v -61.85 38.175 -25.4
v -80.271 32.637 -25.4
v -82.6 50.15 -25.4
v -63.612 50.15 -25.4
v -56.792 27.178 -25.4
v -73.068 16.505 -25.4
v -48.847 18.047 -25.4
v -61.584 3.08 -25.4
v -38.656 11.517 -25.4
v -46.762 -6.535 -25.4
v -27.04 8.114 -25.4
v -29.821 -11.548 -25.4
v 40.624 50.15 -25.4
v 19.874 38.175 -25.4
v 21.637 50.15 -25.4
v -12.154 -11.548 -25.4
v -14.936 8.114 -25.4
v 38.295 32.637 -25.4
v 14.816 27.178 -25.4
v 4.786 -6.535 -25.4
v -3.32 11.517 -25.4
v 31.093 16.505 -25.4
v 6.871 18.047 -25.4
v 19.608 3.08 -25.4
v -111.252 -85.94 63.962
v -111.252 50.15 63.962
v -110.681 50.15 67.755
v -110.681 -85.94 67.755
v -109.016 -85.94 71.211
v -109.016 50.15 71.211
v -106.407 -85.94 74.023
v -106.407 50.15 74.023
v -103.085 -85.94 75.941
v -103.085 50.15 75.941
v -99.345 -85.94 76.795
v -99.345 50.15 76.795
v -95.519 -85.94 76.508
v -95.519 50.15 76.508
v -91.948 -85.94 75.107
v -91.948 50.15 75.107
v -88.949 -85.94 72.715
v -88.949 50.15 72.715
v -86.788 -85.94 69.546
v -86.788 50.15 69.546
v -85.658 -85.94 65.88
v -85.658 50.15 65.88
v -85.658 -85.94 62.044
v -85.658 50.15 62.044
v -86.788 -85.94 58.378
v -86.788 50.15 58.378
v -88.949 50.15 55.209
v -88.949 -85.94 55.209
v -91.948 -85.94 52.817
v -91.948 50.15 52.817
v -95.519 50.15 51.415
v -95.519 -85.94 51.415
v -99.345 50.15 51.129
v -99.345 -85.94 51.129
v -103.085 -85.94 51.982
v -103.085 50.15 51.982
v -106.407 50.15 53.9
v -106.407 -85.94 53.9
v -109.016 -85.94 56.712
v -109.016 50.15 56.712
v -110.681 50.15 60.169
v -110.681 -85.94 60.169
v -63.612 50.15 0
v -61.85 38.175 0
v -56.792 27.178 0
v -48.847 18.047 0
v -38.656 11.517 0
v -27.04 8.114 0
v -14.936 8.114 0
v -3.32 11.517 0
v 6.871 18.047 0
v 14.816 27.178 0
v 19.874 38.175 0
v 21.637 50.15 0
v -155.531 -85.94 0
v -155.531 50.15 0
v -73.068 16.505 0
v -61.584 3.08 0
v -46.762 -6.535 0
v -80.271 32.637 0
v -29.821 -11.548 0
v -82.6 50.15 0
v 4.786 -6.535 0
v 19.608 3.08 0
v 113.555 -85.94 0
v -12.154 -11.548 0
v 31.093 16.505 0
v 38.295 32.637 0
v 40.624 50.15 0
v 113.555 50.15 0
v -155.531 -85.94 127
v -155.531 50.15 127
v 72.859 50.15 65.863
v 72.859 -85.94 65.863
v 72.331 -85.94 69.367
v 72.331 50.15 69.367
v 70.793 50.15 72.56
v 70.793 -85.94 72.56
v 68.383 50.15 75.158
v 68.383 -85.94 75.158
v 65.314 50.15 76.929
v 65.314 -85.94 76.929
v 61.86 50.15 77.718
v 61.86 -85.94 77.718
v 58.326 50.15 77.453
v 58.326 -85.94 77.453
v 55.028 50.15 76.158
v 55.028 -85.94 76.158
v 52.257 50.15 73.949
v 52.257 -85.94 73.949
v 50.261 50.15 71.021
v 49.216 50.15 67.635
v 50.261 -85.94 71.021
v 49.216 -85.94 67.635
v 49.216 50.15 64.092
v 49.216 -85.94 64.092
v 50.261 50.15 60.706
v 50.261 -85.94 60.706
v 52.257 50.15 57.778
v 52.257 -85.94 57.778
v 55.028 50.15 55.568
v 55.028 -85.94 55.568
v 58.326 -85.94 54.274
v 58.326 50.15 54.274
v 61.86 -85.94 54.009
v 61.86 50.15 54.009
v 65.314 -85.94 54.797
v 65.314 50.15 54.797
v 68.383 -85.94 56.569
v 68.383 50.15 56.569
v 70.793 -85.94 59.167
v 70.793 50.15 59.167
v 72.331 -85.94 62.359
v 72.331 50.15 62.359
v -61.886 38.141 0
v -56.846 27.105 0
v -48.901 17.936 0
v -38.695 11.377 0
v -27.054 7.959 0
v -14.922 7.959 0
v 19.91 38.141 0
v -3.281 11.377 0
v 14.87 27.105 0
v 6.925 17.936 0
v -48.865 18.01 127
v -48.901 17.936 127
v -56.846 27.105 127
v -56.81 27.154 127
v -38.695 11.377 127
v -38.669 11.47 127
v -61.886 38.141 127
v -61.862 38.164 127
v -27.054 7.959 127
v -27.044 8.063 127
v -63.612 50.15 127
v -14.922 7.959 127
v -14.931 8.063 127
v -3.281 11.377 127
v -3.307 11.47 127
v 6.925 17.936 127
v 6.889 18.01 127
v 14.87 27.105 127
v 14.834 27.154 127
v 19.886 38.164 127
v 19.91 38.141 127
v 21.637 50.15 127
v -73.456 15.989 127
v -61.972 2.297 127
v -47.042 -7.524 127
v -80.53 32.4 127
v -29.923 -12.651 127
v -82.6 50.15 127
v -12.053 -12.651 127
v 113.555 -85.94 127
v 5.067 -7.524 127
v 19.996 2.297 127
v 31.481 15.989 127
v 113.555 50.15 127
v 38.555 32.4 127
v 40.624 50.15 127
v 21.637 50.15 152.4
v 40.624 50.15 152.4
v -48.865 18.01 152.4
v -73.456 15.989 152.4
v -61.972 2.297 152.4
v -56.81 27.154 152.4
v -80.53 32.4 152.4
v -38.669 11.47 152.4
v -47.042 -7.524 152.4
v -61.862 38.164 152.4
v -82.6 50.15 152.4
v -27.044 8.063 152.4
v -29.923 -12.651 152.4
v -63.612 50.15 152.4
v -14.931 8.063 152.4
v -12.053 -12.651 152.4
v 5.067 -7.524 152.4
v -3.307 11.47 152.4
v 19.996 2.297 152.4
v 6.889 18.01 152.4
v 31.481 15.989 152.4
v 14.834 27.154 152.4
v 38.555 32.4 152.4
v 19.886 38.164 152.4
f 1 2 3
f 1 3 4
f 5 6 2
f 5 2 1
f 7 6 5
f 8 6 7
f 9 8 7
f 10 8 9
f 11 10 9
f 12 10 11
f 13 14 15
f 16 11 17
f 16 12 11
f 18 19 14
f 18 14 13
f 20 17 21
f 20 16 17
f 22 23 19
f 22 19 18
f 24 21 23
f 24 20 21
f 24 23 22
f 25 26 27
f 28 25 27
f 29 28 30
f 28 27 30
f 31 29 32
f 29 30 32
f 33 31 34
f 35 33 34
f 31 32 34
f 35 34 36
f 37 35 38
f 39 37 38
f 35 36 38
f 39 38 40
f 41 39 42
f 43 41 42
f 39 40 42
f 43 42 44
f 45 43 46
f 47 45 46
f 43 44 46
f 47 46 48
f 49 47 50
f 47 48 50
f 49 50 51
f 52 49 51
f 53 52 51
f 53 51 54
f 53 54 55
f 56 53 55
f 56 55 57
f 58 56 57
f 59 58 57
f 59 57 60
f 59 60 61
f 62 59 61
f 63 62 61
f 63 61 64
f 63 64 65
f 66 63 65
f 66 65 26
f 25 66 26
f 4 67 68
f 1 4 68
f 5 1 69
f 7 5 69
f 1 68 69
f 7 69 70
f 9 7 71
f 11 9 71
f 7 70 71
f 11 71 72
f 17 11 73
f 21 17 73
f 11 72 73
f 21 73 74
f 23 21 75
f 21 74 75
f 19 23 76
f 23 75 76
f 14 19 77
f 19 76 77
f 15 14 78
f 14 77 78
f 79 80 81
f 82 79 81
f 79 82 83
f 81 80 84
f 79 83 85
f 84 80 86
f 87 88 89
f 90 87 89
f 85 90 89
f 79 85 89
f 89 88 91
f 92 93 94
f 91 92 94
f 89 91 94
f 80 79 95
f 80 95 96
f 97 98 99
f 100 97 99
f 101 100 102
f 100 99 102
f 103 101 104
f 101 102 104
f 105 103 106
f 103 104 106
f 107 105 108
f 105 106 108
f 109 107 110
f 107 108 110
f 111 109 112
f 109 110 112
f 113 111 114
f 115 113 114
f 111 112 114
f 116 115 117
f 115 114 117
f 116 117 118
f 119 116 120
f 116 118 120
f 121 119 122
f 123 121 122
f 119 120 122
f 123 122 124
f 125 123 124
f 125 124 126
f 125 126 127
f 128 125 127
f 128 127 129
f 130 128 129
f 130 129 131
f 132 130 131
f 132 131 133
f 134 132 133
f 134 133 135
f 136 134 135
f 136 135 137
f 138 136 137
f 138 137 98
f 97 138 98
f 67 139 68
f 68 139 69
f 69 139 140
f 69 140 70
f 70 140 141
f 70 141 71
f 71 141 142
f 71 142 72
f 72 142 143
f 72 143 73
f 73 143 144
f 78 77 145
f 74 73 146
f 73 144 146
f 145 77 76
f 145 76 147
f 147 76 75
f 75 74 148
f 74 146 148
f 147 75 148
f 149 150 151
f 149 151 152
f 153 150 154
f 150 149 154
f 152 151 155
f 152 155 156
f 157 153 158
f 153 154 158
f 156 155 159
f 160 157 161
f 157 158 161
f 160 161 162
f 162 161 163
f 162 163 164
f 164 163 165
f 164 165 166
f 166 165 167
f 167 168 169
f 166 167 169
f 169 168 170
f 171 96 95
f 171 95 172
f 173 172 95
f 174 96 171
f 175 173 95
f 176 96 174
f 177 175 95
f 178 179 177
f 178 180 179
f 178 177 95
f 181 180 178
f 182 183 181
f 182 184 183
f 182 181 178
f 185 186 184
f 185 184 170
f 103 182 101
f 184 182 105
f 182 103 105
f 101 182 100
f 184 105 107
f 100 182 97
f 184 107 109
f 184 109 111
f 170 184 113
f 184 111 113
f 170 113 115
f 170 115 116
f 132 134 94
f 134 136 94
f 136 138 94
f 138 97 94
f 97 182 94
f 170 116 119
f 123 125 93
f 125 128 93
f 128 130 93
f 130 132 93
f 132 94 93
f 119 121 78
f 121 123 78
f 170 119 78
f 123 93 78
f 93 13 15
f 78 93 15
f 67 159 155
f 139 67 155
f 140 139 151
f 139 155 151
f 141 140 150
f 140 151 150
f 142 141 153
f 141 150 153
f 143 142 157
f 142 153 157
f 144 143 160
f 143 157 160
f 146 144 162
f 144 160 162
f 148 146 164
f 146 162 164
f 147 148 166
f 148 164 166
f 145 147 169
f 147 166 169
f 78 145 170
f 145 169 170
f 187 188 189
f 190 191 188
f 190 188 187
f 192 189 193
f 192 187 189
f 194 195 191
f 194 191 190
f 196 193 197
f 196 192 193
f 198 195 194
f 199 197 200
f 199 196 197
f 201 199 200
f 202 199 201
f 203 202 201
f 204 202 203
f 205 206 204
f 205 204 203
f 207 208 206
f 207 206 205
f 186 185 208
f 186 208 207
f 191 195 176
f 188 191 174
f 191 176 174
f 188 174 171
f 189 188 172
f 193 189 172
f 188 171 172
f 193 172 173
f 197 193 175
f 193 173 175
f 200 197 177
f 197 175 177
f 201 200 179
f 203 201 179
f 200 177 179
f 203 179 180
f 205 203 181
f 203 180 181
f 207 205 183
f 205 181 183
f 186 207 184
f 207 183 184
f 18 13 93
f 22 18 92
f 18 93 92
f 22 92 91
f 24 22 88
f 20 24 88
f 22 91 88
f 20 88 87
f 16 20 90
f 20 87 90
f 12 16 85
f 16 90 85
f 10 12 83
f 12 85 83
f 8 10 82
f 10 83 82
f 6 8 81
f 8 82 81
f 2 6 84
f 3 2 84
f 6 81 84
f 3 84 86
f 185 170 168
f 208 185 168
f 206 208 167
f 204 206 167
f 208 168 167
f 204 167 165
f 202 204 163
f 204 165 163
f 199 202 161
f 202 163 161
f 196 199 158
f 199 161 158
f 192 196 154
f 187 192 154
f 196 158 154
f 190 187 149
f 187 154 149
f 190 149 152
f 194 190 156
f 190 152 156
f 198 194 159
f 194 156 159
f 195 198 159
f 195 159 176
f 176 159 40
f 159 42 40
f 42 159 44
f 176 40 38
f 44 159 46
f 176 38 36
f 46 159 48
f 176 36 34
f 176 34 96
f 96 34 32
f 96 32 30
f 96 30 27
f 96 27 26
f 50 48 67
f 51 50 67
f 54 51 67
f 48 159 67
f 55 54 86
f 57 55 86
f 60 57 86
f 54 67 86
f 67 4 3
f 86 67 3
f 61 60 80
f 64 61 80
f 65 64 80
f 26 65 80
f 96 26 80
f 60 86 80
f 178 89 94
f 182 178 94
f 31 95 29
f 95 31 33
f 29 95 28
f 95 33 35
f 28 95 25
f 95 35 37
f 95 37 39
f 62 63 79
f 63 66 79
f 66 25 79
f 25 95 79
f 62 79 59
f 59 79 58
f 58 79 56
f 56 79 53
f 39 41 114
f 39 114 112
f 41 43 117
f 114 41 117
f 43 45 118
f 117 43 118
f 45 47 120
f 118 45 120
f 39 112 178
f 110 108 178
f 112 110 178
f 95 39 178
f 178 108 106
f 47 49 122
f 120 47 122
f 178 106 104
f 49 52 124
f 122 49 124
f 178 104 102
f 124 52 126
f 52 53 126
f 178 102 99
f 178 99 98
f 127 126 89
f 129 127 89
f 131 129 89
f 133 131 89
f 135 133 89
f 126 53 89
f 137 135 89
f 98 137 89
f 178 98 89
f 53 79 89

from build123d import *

# Parameters (mm, degrees)
F0_W      = 269.0858095884
F0_H      = 136.0893808305
F1_DEPTH  = 127
F2_R      = 42.6246558772
F3_DEPTH  = 127.001
F5_DEPTH  = 25.4
F7_DEPTH  = 25.4
F8_R      = 12.8692359505
F9_DEPTH  = 136.0903808305
F10_R     = 11.8876823155
F11_DEPTH = 136.0903808305


with BuildPart() as f1:
    # F0 (on Top) → F1 (new body)
    with BuildSketch(Plane.XY):
        with Locations((-20.9878012538, -17.8948733956)):
            Rectangle(F0_W, F0_H)
    extrude(amount=F1_DEPTH)

    # F2 (on face) → F3 (cut, through all)
    with BuildSketch(Plane.XY.offset(127)):
        with Locations((-20.9878012538, 50.1498170197)):
            Circle(F2_R)
    extrude(amount=-F3_DEPTH, mode=Mode.SUBTRACT)

    # F4 (on face) → F5 (join)
    with BuildSketch(Plane(origin=(0, 0, 0), x_dir=(1, 0, 0), z_dir=(0, 0, -1))):
        with BuildLine():
            Line((21.6368546234, -50.1498170197), (40.624178946, -50.1498170197))
            ThreePointArc((40.624178946, -50.1498170197), (-20.9878012538, 12.1844288341), (-82.5997814536, -50.1498170197))
            Line((-82.5997814536, -50.1498170197), (-63.612457131, -50.1498170197))
            ThreePointArc((-63.612457131, -50.1498170197), (-20.9878012538, -7.6825284563), (21.6368546234, -50.1498170197))
        make_face()
    extrude(amount=F5_DEPTH)

    # F6 (on face) → F7 (join)
    with BuildSketch(Plane.XY.offset(127)):
        with BuildLine():
            ThreePointArc((21.6368546234, 50.1498170197), (-20.9878012538, 7.6304695536), (-63.612457131, 50.1498170197))
            Line((-63.612457131, 50.1498170197), (-82.5997814536, 50.1498170197))
            ThreePointArc((-82.5997814536, 50.1498170197), (-20.9878012538, -13.3016428499), (40.624178946, 50.1498170197))
            Line((40.624178946, 50.1498170197), (21.6368546234, 50.1498170197))
        make_face()
    extrude(amount=F7_DEPTH)

    # F8 (on face) → F9 (cut, through all)
    with BuildSketch(Plane(origin=(0, 50.1498170197, 0), x_dir=(-1, 0, 0), z_dir=(0, 1, 0))):
        with Locations((98.3830988407, 63.9618188143)):
            Circle(F8_R)
    extrude(amount=-F9_DEPTH, mode=Mode.SUBTRACT)

    # F10 (on face) → F11 (cut, through all)
    with BuildSketch(Plane.XZ.offset(85.9395638108)):
        with Locations((60.9713494778, 65.8634230494)):
            Circle(F10_R)
    extrude(amount=-F11_DEPTH, mode=Mode.SUBTRACT)


solid = f1.part
